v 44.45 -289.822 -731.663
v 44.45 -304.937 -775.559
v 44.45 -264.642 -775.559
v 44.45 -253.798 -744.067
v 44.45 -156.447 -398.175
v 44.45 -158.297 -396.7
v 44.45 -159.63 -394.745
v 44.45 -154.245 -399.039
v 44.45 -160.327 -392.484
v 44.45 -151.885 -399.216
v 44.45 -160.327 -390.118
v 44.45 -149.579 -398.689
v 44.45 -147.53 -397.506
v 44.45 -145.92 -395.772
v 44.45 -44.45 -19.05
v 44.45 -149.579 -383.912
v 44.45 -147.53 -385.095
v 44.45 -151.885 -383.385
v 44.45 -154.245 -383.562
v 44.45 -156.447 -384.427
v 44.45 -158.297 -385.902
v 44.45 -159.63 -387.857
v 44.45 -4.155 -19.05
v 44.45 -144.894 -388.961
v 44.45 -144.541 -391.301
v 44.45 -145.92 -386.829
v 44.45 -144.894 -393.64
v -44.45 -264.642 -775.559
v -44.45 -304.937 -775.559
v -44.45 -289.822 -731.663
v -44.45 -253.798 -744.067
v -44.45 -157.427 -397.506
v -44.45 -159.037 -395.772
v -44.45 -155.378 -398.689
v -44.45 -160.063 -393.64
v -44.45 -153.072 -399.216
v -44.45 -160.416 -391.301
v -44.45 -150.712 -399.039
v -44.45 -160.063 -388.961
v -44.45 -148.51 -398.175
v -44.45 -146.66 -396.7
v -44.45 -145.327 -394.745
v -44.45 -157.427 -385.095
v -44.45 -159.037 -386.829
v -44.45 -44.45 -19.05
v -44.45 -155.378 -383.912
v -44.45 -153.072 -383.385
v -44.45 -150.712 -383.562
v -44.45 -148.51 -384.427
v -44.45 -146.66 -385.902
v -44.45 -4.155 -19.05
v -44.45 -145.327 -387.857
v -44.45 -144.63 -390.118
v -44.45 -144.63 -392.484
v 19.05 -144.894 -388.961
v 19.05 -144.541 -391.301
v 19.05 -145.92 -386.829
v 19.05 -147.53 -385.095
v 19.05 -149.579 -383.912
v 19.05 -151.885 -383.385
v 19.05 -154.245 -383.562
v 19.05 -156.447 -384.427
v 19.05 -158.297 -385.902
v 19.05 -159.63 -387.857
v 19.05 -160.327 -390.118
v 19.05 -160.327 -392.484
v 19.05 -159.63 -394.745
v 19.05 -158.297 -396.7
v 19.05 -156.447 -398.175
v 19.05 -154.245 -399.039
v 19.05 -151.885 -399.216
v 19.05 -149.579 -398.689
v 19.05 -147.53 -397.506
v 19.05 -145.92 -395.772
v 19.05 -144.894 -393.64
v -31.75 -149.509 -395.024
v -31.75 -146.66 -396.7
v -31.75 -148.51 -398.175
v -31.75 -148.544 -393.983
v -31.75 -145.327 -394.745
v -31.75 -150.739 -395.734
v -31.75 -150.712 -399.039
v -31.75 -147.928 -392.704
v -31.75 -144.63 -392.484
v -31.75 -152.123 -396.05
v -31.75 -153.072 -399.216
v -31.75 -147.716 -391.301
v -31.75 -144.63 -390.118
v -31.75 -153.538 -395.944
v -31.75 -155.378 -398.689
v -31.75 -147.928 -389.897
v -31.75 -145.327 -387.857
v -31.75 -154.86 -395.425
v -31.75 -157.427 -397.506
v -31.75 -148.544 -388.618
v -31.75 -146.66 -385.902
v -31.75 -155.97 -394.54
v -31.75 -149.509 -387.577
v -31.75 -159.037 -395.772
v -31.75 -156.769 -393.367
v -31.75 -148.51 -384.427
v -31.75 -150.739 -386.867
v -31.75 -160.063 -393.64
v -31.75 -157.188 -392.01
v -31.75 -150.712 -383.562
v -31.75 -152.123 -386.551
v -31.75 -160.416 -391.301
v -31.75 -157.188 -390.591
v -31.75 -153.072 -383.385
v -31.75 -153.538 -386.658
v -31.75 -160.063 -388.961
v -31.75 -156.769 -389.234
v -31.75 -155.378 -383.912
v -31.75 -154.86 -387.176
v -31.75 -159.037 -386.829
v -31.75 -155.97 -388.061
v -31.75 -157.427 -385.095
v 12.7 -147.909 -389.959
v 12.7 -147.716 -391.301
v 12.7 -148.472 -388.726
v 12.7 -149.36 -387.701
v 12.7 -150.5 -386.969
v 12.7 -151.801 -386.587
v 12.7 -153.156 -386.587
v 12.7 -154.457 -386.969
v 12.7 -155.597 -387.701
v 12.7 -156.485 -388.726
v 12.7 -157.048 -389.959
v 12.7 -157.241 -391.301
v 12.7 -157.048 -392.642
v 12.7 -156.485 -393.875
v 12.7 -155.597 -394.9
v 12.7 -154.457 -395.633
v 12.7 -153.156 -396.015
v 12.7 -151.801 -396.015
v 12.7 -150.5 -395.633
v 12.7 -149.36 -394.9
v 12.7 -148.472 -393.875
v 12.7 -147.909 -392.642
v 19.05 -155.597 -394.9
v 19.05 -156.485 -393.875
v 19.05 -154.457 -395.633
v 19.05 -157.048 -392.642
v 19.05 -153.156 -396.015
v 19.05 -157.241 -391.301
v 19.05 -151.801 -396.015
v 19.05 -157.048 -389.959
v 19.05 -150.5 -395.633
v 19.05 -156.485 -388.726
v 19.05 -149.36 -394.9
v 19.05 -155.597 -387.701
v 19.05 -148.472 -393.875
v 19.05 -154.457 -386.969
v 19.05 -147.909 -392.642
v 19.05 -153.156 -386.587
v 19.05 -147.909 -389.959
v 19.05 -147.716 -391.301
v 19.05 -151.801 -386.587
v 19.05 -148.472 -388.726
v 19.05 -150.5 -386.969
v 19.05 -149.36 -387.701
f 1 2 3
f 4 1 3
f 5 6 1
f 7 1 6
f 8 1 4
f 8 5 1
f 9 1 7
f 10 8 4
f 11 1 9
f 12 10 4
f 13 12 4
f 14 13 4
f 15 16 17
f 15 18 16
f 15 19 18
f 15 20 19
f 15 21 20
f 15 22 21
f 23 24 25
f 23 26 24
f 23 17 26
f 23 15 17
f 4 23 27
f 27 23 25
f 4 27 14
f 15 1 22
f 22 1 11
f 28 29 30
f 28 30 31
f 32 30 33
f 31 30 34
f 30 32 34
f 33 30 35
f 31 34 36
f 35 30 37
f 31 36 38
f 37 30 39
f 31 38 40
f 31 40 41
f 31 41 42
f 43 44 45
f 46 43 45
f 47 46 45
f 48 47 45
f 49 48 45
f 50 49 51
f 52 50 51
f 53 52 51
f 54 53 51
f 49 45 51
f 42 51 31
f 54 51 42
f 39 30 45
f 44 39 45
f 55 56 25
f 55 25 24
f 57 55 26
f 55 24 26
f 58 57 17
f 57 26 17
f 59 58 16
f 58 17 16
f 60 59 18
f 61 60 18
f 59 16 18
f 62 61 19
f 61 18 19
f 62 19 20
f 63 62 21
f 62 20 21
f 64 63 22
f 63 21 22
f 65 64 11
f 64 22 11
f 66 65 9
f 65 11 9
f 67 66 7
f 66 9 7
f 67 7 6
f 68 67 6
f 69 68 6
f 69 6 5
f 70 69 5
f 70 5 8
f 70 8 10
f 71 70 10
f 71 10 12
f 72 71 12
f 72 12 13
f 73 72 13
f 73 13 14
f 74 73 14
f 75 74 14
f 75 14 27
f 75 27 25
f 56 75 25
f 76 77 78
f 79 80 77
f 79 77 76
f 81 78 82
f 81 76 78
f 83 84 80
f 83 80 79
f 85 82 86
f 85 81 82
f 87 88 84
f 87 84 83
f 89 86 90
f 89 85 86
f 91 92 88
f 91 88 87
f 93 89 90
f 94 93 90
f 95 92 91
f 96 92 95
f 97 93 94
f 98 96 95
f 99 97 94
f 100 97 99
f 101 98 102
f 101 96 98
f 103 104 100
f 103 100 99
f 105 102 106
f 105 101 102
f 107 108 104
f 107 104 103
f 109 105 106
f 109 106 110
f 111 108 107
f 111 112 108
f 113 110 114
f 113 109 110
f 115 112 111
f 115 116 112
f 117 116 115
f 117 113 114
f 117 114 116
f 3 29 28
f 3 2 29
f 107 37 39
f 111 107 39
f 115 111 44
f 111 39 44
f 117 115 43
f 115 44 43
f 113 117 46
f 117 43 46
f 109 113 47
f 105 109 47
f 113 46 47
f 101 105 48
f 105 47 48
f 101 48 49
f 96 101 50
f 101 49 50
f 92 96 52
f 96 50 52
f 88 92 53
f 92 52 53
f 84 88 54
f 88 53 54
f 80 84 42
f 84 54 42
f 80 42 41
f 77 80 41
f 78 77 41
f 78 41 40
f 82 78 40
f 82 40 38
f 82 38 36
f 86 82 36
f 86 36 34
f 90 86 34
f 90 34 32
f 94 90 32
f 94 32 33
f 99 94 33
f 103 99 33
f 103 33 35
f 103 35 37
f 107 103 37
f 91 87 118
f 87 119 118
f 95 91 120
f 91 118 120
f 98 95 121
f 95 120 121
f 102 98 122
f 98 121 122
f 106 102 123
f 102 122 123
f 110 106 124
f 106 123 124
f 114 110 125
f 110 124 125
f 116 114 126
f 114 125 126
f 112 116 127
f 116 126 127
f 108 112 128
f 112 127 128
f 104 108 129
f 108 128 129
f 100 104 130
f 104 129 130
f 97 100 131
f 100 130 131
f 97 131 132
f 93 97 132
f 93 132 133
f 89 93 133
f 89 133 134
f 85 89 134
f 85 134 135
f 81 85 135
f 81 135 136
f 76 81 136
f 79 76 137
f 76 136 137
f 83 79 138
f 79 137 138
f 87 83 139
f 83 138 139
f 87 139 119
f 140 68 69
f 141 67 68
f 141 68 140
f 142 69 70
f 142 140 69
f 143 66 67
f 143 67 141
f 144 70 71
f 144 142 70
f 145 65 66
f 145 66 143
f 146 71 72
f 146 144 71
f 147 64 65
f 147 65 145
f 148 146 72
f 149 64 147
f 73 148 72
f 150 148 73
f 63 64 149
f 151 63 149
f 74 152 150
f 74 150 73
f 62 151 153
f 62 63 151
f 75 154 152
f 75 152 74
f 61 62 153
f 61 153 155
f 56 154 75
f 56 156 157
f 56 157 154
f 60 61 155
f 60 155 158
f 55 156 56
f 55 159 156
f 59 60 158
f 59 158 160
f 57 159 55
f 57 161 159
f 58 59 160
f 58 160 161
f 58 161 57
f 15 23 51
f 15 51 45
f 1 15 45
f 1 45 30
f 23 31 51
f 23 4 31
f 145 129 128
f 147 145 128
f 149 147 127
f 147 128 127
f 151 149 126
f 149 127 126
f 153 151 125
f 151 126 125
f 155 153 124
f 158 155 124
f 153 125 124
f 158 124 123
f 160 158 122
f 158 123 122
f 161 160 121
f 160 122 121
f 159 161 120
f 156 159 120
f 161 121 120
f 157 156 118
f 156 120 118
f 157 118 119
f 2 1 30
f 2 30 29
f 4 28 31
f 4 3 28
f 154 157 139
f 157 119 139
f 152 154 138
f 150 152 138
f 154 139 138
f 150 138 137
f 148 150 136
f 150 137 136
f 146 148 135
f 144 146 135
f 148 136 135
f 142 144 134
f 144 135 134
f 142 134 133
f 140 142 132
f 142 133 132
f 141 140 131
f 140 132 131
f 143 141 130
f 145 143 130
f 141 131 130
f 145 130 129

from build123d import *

# Parameters (mm, degrees)
F1_DEPTH       = 44.45
F1_DEPTH_BACK  = 44.45
F3_D           = 9.525
F3_DEPTH       = 31.75
F3_CBORE_D     = 15.875
F3_CBORE_DEPTH = 25.4
F5_D           = 9.525
F5_CBORE_D     = 15.875
F5_CBORE_DEPTH = 12.7


with BuildPart() as f1:
    # F0 (on Right) → F1 (new body, two sides)
    with BuildSketch(Plane.YZ) as f1_sk:
        Polygon((-253.798136, -744.067323), (-4.154652, -19.05), (-44.45, -19.05), (-289.822394, -731.663176), align=None)
        Polygon((-264.641732, -775.559412), (-253.798136, -744.067323), (-289.822394, -731.663176), (-304.93708, -775.559412), align=None)
    extrude(amount=F1_DEPTH)
    extrude(f1_sk.sketch, amount=-F1_DEPTH_BACK)

    # F3
    with Locations(Plane.YZ.offset(44.45)):
        with Locations((-152.478508, -391.300663)):
            CounterBoreHole(F3_D / 2, F3_CBORE_D / 2, F3_CBORE_DEPTH, depth=F3_DEPTH)

    # F5 (through all)
    with Locations(Plane(origin=(-44.45, 0, 0), x_dir=(0, -1, 0), z_dir=(-1, 0, 0))):
        with Locations((152.478508, -391.300663)):
            CounterBoreHole(F5_D / 2, F5_CBORE_D / 2, F5_CBORE_DEPTH)


solid = f1.part
